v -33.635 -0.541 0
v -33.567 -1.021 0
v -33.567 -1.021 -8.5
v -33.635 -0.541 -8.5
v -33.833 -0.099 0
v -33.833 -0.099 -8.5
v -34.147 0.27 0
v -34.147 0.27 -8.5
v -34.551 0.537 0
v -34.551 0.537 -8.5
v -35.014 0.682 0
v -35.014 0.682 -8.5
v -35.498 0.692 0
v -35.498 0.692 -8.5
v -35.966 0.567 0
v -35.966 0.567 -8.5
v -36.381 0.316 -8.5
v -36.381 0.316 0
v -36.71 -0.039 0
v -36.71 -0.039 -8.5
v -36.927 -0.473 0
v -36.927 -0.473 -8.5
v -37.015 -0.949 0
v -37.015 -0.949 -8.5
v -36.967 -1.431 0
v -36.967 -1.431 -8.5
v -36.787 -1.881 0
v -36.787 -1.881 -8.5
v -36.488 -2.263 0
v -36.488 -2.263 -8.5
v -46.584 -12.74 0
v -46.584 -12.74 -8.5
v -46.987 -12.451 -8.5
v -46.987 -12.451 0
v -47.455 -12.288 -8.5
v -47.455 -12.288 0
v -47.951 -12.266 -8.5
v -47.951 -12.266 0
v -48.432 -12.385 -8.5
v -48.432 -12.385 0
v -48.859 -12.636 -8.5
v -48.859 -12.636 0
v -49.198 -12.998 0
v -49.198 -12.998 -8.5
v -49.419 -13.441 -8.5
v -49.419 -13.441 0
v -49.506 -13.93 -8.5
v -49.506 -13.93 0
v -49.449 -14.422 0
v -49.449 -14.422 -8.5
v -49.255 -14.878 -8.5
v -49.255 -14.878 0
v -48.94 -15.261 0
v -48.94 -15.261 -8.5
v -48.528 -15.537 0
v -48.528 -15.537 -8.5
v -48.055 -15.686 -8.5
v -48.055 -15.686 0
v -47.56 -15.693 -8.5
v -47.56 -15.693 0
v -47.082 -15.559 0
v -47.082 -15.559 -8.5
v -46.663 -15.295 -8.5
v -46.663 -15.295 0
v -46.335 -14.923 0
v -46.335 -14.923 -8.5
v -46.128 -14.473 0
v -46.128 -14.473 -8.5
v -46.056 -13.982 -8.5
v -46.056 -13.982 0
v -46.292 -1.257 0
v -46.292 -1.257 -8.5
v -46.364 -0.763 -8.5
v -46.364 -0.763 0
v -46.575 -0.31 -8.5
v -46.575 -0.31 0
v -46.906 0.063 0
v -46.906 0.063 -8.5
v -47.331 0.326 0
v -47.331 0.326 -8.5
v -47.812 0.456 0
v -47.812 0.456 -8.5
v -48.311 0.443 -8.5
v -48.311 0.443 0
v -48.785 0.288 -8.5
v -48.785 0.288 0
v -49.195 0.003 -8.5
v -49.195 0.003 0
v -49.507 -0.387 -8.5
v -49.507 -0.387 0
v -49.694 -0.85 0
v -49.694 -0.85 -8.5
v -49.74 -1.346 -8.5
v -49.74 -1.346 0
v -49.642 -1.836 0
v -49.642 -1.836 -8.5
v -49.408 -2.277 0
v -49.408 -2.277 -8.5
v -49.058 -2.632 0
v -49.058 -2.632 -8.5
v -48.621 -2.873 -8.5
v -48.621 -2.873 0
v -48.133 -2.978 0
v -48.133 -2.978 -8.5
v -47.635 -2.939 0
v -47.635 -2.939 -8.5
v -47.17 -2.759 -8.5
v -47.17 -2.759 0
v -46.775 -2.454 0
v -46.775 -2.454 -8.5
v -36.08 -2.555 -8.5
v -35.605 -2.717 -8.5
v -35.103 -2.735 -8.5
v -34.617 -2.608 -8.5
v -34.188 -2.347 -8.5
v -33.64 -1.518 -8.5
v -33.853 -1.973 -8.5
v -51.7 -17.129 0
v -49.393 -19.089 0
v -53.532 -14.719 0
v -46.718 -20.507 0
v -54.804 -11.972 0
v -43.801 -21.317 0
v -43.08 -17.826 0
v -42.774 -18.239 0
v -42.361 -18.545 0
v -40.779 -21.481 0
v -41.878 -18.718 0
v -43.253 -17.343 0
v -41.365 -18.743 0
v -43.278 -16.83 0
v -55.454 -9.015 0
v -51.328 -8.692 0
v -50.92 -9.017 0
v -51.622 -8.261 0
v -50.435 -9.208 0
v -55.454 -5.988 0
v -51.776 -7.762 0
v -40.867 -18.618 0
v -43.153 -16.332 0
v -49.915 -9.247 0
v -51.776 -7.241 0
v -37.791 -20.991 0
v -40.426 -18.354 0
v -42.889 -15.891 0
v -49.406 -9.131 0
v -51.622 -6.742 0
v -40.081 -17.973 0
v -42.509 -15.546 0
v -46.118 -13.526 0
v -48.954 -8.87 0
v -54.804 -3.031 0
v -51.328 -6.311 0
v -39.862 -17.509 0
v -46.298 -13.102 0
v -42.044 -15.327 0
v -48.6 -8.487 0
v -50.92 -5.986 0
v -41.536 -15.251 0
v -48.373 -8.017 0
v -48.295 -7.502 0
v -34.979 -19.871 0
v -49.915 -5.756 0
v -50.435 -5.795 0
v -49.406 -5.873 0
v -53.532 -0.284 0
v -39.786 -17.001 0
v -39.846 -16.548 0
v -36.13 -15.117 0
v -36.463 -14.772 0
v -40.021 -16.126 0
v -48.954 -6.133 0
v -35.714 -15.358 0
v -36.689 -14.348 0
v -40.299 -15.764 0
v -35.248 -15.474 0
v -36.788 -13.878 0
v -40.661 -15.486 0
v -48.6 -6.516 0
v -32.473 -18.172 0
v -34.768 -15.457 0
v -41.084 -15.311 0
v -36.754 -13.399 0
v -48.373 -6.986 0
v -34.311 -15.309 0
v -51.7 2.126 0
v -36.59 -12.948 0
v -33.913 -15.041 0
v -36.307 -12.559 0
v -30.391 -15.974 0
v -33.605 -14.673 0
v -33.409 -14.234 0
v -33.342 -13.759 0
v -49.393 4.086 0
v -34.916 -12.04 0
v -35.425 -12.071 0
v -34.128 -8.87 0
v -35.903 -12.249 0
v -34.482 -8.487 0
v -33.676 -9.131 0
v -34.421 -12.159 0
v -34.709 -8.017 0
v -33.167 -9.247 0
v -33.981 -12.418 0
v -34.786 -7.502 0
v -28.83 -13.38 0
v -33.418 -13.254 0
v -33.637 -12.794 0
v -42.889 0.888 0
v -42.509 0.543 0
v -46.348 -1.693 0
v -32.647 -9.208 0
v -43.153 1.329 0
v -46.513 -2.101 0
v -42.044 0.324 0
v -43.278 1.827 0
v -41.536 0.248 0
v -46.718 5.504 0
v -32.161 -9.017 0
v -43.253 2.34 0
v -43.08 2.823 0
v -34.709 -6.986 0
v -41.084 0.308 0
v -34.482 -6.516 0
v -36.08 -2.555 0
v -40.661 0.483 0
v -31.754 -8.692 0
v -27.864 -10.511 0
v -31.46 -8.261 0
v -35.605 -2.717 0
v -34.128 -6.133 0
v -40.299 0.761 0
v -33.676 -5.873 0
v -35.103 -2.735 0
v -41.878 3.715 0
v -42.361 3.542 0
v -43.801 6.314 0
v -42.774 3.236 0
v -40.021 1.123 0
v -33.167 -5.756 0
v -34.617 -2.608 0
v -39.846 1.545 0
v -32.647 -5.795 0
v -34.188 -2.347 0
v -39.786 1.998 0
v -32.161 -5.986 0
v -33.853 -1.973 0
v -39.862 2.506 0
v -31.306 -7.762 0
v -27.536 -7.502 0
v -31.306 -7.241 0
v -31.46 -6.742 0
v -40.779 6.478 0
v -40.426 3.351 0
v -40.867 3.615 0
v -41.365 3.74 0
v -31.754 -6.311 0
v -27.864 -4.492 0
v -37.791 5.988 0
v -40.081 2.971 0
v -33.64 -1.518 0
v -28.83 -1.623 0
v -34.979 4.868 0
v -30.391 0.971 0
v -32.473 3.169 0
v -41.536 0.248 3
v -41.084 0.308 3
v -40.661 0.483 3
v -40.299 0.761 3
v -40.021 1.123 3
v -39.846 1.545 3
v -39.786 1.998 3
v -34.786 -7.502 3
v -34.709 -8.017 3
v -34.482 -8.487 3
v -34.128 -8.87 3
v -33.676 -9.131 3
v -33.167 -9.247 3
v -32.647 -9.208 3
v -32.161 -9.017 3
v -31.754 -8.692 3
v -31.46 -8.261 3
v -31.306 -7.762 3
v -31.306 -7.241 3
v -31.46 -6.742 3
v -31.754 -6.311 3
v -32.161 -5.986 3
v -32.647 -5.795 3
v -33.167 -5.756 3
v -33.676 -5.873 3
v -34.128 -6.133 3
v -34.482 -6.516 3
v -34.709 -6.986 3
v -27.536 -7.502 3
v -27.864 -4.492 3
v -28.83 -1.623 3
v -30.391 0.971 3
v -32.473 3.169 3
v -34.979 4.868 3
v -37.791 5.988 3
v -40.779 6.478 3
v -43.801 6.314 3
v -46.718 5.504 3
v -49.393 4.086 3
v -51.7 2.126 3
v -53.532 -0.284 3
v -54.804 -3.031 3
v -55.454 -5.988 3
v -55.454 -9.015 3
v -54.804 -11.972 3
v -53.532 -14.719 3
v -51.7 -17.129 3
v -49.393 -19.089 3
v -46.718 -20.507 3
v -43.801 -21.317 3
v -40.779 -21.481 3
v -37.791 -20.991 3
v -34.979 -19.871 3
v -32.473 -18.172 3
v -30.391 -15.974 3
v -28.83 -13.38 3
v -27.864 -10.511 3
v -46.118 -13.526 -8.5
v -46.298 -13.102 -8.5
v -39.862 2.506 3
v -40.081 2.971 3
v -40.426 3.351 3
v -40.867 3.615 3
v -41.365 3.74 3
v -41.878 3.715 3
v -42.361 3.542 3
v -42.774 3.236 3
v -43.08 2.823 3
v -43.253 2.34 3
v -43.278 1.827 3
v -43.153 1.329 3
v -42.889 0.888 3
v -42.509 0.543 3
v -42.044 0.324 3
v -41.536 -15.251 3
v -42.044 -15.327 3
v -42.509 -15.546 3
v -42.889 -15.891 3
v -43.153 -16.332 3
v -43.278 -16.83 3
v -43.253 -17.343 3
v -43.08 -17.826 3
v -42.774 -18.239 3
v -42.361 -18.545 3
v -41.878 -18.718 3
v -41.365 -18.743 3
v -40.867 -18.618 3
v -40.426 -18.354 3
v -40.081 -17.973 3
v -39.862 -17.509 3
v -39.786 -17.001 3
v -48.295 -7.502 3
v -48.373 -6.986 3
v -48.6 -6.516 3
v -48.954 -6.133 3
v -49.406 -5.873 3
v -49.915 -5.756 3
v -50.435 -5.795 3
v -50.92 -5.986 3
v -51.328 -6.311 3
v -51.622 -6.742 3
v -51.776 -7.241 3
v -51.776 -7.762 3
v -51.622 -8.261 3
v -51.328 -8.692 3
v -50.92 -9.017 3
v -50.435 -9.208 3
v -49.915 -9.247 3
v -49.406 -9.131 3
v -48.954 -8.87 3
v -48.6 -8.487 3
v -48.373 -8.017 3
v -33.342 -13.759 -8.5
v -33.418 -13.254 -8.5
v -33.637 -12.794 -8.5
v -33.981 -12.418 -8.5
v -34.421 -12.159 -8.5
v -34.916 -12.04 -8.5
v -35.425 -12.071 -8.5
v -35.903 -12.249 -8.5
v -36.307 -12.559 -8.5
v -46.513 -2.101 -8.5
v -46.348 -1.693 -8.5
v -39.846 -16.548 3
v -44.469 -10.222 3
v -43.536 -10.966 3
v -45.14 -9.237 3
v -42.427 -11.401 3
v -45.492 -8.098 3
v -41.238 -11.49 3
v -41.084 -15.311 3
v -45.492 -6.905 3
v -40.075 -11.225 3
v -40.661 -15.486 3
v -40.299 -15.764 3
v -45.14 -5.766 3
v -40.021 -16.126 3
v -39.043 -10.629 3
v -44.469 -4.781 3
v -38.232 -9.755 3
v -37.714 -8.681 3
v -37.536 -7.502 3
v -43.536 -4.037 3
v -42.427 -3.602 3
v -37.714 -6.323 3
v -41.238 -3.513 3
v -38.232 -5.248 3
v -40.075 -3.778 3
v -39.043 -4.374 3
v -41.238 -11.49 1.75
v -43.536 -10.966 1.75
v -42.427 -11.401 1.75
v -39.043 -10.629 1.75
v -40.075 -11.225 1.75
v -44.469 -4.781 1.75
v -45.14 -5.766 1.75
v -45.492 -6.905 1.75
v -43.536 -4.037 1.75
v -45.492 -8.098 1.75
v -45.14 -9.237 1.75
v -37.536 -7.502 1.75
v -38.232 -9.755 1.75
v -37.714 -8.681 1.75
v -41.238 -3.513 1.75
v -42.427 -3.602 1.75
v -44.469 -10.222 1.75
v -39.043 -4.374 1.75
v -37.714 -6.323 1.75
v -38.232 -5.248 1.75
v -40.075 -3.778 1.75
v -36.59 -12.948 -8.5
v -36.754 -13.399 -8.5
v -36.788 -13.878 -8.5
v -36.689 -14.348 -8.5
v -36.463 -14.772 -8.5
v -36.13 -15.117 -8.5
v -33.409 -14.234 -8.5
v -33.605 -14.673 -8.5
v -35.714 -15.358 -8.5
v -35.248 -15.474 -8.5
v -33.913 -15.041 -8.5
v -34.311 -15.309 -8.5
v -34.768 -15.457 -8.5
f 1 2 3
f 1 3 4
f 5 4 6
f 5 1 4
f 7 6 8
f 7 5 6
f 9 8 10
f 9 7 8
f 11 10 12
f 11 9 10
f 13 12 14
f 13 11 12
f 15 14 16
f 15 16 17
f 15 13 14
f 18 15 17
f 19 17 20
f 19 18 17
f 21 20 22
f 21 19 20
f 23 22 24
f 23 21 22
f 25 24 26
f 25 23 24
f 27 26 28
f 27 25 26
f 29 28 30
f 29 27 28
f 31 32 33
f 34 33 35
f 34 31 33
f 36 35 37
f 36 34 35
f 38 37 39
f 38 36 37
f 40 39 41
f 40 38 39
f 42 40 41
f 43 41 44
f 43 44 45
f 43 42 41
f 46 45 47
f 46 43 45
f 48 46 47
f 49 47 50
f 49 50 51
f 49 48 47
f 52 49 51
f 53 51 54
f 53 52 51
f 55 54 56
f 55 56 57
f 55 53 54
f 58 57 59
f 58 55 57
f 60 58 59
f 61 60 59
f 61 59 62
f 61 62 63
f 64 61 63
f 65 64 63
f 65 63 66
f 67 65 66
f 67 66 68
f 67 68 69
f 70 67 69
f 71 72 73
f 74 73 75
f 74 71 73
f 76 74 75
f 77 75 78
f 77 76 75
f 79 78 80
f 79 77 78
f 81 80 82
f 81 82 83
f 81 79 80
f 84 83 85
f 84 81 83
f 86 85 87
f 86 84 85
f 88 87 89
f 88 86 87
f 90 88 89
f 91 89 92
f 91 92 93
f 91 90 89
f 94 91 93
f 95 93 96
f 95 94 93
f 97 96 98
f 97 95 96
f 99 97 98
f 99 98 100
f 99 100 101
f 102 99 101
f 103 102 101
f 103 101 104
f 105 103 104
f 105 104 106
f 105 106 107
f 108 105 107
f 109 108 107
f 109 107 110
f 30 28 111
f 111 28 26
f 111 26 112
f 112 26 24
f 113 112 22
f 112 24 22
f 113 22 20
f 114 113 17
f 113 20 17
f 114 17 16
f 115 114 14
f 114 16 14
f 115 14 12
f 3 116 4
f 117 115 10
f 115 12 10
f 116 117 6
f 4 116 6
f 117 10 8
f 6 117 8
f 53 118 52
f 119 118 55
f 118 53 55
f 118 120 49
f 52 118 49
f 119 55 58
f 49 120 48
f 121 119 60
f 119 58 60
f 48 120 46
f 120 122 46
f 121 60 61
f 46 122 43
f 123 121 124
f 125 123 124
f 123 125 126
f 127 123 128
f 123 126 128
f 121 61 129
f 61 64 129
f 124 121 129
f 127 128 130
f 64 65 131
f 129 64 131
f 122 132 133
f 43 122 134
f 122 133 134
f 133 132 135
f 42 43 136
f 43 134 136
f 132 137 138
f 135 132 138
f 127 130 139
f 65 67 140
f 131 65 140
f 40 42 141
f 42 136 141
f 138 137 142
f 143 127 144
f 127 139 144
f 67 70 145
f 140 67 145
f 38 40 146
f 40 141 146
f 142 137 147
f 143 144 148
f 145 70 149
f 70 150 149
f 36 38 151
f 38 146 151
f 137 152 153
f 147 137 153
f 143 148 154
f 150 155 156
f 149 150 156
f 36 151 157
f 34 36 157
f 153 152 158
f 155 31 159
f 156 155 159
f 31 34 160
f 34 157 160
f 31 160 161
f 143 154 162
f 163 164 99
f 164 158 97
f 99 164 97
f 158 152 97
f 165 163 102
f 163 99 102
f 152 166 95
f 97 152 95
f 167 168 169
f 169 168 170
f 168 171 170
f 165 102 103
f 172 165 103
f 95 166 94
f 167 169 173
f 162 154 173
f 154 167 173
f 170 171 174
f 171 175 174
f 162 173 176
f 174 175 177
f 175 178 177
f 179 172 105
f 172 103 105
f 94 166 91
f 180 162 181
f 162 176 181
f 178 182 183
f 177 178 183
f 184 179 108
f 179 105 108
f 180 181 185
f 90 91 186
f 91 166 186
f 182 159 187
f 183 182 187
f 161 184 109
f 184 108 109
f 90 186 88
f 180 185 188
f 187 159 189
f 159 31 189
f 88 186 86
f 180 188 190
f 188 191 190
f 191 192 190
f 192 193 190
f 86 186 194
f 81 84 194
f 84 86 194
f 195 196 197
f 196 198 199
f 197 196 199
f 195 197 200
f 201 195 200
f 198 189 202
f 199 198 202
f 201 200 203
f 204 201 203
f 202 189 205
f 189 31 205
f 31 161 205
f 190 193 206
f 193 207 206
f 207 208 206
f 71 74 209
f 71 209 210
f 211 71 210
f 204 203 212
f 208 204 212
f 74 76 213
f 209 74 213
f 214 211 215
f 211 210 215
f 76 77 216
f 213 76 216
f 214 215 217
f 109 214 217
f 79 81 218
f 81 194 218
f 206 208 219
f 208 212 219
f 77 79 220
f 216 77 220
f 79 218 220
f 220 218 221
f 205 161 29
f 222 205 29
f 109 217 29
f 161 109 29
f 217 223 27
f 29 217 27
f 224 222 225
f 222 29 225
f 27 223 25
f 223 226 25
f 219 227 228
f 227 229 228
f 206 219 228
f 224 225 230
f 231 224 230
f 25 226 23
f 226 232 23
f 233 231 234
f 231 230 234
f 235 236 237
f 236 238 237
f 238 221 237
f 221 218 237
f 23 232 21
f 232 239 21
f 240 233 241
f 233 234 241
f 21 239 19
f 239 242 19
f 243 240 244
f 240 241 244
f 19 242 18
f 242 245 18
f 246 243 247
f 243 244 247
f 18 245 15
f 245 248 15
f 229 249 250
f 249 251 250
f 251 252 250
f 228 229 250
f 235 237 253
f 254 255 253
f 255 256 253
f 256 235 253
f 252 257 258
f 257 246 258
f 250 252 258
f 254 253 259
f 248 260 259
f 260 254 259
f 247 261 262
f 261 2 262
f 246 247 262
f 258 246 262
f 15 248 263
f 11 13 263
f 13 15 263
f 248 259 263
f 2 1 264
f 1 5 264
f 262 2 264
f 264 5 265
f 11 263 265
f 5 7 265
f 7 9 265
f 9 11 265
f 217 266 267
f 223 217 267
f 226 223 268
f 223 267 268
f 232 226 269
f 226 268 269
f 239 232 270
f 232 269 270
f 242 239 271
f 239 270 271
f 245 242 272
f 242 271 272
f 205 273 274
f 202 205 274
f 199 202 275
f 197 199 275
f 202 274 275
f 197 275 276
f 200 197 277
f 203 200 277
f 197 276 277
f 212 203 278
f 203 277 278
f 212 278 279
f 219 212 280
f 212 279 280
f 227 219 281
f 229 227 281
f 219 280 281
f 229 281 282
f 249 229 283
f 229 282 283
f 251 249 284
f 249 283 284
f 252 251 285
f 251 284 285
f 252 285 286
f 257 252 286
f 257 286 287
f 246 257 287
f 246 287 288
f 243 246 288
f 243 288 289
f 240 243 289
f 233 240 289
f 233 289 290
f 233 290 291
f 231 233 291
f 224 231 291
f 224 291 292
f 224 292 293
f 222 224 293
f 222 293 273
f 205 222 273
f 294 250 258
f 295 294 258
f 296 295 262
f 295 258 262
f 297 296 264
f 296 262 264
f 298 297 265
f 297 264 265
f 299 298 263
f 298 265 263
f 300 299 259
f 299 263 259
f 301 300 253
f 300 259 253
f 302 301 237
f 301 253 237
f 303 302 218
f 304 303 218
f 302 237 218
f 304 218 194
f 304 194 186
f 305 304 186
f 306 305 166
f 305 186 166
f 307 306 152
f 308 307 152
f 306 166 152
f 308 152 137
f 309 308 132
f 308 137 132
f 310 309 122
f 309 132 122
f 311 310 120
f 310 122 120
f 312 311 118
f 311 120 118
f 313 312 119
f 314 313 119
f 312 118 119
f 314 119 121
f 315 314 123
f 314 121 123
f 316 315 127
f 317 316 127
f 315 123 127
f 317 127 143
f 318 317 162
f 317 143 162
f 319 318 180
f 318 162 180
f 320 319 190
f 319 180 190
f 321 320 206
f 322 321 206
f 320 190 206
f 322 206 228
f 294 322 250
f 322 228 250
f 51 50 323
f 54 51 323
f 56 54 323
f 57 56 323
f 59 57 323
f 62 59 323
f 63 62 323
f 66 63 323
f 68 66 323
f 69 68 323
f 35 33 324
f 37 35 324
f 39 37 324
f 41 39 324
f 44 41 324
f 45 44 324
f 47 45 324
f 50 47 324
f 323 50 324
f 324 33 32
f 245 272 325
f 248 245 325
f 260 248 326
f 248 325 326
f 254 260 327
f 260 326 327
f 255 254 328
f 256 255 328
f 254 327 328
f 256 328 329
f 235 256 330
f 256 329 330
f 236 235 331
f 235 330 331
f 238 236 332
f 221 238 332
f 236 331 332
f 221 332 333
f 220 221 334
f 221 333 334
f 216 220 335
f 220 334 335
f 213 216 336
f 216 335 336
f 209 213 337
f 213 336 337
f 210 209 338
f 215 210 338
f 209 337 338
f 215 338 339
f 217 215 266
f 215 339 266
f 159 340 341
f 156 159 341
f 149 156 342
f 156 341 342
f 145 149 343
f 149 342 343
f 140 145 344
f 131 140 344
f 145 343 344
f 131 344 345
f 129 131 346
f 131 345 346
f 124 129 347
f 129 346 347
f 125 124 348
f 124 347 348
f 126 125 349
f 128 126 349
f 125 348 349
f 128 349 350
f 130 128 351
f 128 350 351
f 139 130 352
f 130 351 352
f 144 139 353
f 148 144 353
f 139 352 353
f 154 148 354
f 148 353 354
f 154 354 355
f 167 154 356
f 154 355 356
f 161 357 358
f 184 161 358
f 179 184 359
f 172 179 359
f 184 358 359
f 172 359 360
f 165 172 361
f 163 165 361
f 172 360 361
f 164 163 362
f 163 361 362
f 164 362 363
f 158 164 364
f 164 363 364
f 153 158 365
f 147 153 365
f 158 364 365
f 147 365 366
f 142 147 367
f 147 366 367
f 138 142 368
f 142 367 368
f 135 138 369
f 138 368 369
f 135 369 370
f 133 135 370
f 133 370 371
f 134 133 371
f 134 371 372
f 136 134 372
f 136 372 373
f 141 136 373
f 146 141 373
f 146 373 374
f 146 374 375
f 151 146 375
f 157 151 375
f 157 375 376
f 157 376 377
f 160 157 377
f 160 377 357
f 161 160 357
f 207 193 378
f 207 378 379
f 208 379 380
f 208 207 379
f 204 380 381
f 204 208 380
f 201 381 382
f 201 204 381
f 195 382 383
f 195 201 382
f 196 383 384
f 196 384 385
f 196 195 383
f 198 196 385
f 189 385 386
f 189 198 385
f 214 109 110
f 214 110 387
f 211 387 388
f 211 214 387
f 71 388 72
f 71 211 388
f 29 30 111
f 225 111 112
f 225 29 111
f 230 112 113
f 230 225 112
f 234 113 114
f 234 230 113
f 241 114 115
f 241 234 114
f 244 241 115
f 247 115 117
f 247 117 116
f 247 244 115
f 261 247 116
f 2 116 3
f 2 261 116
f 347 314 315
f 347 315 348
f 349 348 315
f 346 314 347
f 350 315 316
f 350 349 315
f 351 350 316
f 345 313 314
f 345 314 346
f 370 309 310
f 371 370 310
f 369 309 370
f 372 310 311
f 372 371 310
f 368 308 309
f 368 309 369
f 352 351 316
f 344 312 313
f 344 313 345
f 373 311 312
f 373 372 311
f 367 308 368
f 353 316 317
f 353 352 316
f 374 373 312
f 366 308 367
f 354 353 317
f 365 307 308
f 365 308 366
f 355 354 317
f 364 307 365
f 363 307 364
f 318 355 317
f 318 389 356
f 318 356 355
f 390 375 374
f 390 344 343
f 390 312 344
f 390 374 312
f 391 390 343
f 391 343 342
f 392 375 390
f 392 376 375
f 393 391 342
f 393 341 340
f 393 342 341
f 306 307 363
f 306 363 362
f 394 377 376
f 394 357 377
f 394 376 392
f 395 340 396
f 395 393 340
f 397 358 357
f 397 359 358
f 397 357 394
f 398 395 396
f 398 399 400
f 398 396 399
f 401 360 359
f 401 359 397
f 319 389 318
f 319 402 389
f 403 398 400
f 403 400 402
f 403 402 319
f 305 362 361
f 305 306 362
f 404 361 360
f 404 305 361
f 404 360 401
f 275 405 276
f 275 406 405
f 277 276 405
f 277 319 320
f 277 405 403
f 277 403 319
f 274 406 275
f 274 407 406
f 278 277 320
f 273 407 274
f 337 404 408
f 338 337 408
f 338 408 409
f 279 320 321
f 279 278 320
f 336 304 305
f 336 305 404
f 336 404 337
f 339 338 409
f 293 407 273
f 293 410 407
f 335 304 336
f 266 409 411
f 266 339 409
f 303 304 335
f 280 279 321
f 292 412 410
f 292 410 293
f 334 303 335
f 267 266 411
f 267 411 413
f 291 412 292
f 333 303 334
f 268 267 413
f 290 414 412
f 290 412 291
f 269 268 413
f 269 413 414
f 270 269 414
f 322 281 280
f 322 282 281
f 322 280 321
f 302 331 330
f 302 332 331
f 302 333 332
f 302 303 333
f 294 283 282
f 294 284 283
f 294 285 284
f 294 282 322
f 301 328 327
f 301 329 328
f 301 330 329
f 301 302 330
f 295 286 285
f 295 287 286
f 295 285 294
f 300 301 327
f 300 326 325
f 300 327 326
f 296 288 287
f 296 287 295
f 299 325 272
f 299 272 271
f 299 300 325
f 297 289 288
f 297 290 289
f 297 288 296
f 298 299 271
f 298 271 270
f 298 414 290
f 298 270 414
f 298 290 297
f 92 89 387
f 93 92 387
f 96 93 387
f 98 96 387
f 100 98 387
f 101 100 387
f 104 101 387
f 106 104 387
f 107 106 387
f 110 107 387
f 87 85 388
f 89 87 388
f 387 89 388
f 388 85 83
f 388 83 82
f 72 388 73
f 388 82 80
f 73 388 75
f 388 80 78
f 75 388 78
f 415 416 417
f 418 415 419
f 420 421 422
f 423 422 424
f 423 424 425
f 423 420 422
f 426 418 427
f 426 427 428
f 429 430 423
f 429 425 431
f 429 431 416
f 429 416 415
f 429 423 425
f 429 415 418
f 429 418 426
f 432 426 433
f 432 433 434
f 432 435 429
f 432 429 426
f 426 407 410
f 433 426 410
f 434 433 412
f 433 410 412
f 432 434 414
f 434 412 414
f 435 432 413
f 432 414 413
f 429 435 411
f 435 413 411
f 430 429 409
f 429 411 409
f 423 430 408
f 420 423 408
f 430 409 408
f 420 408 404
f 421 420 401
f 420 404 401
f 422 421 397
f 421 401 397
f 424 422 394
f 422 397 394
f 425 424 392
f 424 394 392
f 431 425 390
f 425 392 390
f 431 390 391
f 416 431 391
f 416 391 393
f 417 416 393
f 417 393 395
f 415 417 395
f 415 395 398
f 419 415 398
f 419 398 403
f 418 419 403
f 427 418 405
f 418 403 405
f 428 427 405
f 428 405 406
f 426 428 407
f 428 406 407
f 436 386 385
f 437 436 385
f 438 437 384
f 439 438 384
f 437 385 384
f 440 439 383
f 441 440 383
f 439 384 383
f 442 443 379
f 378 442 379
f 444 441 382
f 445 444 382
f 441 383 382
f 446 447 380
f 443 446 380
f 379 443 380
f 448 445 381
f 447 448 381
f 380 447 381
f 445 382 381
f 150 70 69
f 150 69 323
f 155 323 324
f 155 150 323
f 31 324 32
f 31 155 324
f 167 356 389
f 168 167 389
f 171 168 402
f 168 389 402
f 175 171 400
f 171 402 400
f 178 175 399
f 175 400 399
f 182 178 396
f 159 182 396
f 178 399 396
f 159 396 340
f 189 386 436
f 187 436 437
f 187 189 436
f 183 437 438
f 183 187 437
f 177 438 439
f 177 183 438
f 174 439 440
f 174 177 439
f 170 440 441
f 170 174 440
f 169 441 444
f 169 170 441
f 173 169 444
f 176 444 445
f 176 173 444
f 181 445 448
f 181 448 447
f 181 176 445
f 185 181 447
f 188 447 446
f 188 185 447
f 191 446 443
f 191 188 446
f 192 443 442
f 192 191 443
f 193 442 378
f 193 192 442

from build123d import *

# Parameters (mm, degrees)
F0_R     = 14
F1_DEPTH = 3
F2_R     = 4
F3_DEPTH = 1.25
F5_DEPTH = 11.5
F6_DEPTH = 25.4
F4_R     = 1.75
F7_DEPTH = 25.4


# Not quite as in the source:
# - a feature names something its author has since deleted; it is built from what else it names


with BuildPart() as f1:
    # F0 (on Top) → F1 (new body)
    with BuildSketch(Plane.XY):
        with Locations((-41.5364727378, -7.5015998445)):
            Circle(F0_R)
    extrude(amount=F1_DEPTH)

    # F2 (on face) → F3 (cut)
    with BuildSketch(Plane.XY.offset(3)):
        with Locations((-41.5364727378, -7.5015998445)):
            Circle(F2_R)
    extrude(amount=-F3_DEPTH, mode=Mode.SUBTRACT)

    # F4 (on face) → F5 (join)
    with BuildSketch(Plane.XY.offset(3)):
        with BuildLine():
            ThreePointArc((-46.2922708097, -1.256661386), (-49.6170112359, -0.6113276981), (-46.7751178459, -2.4536079239))
            ThreePointArc((-46.7751178459, -2.4536079239), (-46.4175303835, -1.9019950739), (-46.2922708097, -1.256661386))
        make_face()
        with BuildLine():
            ThreePointArc((-33.3423393435, -13.758620951), (-34.4205133346, -12.1594833352), (-36.3072565774, -12.5593585722))
            ThreePointArc((-36.3072565774, -12.5593585722), (-35.7141653523, -15.3577585668), (-33.3423393435, -13.758620951))
        make_face()
        with BuildLine():
            ThreePointArc((-46.0564111963, -13.9823979165), (-46.193904066, -13.3075304398), (-46.5844646585, -12.7402449527))
            ThreePointArc((-46.5844646585, -12.7402449527), (-49.3689183267, -14.6572653931), (-46.0564111963, -13.9823979165))
        make_face()
        with BuildLine():
            ThreePointArc((-33.5665342792, -1.0208017726), (-35.9664017559, 0.5667053577), (-36.4884808171, -2.2629547364))
            ThreePointArc((-36.4884808171, -2.2629547364), (-34.6166668026, -2.608308903), (-33.5665342792, -1.0208017726))
        make_face()
    extrude(amount=-F5_DEPTH)

    # F4 (on face) → F6 (cut)
    with BuildSketch(Plane.XY.offset(3)):
        with BuildLine():
            ThreePointArc((-39.7864727378, 1.9984001555), (-42.7739096049, 3.2358370225), (-41.5364727378, 0.2484001555))
            ThreePointArc((-41.5364727378, 0.2484001555), (-40.2990358707, 0.7609632884), (-39.7864727378, 1.9984001555))
        make_face()
        with BuildLine():
            ThreePointArc((-31.2864727378, -7.5015998445), (-33.0364727378, -5.7515998445), (-34.7864727378, -7.5015998445))
            ThreePointArc((-34.7864727378, -7.5015998445), (-33.0364727378, -9.2515998445), (-31.2864727378, -7.5015998445))
        make_face()
        with BuildLine():
            ThreePointArc((-39.7864727378, -17.0011998445), (-40.2990358707, -15.7637629775), (-41.5364727378, -15.2511998445))
            ThreePointArc((-41.5364727378, -15.2511998445), (-42.7739096049, -18.2386367116), (-39.7864727378, -17.0011998445))
        make_face()
    extrude(amount=-F6_DEPTH, mode=Mode.SUBTRACT)

    # F4 (on face) → F7 (cut)
    with BuildSketch(Plane.XY.offset(3)):
        with Locations((-50.0454727378, -7.5015998445)):
            Circle(F4_R)
    extrude(amount=-F7_DEPTH, mode=Mode.SUBTRACT)


solid = f1.part
